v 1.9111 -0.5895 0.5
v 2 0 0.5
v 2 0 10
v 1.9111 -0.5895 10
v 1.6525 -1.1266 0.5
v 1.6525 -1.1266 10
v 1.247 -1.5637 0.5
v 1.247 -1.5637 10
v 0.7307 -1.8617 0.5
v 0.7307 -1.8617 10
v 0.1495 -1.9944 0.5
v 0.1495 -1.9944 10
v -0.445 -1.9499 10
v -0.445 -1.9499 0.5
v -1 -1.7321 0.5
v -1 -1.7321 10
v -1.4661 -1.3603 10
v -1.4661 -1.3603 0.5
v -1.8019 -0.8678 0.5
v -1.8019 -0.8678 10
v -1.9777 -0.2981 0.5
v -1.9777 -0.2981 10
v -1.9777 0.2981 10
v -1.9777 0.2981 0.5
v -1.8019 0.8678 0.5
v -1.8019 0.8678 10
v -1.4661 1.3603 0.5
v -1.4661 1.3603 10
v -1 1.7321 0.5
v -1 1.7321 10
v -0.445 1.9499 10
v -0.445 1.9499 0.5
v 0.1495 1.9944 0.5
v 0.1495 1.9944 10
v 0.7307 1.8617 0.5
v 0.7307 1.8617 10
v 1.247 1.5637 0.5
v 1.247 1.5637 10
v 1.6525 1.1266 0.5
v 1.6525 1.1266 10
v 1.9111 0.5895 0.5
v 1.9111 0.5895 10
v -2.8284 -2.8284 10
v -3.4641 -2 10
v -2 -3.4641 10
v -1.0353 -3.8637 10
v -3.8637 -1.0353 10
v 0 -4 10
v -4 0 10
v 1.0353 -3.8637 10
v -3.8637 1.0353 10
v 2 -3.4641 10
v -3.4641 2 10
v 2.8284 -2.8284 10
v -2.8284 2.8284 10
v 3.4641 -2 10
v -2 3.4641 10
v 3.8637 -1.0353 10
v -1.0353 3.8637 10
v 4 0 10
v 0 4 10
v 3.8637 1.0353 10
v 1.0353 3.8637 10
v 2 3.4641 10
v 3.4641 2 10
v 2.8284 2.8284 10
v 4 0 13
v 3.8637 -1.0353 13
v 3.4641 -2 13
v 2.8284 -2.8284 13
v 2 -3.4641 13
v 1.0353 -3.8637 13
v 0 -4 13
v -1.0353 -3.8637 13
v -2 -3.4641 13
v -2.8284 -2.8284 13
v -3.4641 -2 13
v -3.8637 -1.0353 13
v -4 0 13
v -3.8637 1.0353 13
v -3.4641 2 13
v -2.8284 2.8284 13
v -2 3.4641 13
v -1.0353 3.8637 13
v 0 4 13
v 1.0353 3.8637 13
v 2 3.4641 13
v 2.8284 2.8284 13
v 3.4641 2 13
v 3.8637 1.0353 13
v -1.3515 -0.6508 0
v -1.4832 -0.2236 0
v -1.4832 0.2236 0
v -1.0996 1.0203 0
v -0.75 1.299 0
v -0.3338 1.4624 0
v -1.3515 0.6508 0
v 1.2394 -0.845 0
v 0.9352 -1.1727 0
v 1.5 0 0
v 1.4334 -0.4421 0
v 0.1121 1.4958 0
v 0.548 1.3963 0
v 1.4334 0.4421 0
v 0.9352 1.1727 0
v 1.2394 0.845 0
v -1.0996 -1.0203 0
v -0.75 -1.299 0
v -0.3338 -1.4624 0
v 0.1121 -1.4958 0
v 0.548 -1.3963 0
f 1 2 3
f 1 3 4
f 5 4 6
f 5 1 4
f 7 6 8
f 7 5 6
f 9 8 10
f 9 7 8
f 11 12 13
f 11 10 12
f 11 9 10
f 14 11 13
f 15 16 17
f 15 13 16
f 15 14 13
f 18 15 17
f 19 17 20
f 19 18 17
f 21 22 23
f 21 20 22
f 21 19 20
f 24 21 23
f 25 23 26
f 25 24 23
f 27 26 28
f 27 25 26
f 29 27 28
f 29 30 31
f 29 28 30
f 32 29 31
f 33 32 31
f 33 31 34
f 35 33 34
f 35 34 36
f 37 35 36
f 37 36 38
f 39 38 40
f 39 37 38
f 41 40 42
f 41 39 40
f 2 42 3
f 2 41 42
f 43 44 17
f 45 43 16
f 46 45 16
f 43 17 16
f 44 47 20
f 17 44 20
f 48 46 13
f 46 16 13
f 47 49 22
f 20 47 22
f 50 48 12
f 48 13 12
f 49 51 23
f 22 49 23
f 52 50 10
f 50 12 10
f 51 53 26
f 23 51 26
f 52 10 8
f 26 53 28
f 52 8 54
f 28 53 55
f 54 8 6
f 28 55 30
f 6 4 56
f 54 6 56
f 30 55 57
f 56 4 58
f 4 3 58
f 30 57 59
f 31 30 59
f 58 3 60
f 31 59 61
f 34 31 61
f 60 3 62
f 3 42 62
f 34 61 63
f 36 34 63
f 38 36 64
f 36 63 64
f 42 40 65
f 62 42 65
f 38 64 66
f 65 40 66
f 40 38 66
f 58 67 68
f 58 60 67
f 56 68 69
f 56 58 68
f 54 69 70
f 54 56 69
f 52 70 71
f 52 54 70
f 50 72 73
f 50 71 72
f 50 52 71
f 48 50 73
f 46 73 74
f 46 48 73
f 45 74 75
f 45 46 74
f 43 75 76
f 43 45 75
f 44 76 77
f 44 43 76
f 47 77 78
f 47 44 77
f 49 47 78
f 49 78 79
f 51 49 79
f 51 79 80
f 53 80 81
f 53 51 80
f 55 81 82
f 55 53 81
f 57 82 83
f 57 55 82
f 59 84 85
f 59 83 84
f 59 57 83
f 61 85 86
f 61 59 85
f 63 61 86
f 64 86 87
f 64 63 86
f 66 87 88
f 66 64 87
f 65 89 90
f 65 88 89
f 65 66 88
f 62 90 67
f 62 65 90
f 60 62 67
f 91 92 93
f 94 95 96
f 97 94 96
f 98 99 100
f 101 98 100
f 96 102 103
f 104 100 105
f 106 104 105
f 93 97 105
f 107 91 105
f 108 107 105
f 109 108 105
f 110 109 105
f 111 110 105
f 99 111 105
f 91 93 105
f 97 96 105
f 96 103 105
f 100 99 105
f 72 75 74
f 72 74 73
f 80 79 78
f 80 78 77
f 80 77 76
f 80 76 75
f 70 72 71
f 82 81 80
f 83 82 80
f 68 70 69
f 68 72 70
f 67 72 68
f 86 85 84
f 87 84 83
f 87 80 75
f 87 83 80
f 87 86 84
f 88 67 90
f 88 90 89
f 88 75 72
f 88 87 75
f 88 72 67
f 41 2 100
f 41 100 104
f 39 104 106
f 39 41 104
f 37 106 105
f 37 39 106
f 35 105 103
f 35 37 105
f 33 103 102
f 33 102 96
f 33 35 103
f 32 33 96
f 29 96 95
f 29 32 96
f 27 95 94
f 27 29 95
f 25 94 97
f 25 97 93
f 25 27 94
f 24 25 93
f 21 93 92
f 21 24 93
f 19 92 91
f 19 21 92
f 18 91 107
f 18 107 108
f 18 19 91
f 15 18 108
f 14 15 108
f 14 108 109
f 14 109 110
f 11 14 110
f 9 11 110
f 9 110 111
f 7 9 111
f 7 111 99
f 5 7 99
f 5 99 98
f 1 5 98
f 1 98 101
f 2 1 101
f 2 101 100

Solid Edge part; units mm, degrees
sketch "Sketch1" plane through (0, 0, 0) normal (0, 0, 1) x (1, 0, 0)
  circle A0 centre (0, 0) radius 2
  dimension "D1" = 4
extrude "Protrusion1" add sketch "Sketch1" along normal blind 10
sketch "Sketch2" plane through (0, 0, 10) normal (0, 0, 1) x (1, 0, 0)
  circle A0 centre (0, 0) radius 4
  dimension "D1" = 8
extrude "Extrusionsausprägung_2" add sketch "Sketch2" along normal blind 3
chamfer "Fase_1" distance 0.5 angle 45 1 edges at (-2, 0, 0)
